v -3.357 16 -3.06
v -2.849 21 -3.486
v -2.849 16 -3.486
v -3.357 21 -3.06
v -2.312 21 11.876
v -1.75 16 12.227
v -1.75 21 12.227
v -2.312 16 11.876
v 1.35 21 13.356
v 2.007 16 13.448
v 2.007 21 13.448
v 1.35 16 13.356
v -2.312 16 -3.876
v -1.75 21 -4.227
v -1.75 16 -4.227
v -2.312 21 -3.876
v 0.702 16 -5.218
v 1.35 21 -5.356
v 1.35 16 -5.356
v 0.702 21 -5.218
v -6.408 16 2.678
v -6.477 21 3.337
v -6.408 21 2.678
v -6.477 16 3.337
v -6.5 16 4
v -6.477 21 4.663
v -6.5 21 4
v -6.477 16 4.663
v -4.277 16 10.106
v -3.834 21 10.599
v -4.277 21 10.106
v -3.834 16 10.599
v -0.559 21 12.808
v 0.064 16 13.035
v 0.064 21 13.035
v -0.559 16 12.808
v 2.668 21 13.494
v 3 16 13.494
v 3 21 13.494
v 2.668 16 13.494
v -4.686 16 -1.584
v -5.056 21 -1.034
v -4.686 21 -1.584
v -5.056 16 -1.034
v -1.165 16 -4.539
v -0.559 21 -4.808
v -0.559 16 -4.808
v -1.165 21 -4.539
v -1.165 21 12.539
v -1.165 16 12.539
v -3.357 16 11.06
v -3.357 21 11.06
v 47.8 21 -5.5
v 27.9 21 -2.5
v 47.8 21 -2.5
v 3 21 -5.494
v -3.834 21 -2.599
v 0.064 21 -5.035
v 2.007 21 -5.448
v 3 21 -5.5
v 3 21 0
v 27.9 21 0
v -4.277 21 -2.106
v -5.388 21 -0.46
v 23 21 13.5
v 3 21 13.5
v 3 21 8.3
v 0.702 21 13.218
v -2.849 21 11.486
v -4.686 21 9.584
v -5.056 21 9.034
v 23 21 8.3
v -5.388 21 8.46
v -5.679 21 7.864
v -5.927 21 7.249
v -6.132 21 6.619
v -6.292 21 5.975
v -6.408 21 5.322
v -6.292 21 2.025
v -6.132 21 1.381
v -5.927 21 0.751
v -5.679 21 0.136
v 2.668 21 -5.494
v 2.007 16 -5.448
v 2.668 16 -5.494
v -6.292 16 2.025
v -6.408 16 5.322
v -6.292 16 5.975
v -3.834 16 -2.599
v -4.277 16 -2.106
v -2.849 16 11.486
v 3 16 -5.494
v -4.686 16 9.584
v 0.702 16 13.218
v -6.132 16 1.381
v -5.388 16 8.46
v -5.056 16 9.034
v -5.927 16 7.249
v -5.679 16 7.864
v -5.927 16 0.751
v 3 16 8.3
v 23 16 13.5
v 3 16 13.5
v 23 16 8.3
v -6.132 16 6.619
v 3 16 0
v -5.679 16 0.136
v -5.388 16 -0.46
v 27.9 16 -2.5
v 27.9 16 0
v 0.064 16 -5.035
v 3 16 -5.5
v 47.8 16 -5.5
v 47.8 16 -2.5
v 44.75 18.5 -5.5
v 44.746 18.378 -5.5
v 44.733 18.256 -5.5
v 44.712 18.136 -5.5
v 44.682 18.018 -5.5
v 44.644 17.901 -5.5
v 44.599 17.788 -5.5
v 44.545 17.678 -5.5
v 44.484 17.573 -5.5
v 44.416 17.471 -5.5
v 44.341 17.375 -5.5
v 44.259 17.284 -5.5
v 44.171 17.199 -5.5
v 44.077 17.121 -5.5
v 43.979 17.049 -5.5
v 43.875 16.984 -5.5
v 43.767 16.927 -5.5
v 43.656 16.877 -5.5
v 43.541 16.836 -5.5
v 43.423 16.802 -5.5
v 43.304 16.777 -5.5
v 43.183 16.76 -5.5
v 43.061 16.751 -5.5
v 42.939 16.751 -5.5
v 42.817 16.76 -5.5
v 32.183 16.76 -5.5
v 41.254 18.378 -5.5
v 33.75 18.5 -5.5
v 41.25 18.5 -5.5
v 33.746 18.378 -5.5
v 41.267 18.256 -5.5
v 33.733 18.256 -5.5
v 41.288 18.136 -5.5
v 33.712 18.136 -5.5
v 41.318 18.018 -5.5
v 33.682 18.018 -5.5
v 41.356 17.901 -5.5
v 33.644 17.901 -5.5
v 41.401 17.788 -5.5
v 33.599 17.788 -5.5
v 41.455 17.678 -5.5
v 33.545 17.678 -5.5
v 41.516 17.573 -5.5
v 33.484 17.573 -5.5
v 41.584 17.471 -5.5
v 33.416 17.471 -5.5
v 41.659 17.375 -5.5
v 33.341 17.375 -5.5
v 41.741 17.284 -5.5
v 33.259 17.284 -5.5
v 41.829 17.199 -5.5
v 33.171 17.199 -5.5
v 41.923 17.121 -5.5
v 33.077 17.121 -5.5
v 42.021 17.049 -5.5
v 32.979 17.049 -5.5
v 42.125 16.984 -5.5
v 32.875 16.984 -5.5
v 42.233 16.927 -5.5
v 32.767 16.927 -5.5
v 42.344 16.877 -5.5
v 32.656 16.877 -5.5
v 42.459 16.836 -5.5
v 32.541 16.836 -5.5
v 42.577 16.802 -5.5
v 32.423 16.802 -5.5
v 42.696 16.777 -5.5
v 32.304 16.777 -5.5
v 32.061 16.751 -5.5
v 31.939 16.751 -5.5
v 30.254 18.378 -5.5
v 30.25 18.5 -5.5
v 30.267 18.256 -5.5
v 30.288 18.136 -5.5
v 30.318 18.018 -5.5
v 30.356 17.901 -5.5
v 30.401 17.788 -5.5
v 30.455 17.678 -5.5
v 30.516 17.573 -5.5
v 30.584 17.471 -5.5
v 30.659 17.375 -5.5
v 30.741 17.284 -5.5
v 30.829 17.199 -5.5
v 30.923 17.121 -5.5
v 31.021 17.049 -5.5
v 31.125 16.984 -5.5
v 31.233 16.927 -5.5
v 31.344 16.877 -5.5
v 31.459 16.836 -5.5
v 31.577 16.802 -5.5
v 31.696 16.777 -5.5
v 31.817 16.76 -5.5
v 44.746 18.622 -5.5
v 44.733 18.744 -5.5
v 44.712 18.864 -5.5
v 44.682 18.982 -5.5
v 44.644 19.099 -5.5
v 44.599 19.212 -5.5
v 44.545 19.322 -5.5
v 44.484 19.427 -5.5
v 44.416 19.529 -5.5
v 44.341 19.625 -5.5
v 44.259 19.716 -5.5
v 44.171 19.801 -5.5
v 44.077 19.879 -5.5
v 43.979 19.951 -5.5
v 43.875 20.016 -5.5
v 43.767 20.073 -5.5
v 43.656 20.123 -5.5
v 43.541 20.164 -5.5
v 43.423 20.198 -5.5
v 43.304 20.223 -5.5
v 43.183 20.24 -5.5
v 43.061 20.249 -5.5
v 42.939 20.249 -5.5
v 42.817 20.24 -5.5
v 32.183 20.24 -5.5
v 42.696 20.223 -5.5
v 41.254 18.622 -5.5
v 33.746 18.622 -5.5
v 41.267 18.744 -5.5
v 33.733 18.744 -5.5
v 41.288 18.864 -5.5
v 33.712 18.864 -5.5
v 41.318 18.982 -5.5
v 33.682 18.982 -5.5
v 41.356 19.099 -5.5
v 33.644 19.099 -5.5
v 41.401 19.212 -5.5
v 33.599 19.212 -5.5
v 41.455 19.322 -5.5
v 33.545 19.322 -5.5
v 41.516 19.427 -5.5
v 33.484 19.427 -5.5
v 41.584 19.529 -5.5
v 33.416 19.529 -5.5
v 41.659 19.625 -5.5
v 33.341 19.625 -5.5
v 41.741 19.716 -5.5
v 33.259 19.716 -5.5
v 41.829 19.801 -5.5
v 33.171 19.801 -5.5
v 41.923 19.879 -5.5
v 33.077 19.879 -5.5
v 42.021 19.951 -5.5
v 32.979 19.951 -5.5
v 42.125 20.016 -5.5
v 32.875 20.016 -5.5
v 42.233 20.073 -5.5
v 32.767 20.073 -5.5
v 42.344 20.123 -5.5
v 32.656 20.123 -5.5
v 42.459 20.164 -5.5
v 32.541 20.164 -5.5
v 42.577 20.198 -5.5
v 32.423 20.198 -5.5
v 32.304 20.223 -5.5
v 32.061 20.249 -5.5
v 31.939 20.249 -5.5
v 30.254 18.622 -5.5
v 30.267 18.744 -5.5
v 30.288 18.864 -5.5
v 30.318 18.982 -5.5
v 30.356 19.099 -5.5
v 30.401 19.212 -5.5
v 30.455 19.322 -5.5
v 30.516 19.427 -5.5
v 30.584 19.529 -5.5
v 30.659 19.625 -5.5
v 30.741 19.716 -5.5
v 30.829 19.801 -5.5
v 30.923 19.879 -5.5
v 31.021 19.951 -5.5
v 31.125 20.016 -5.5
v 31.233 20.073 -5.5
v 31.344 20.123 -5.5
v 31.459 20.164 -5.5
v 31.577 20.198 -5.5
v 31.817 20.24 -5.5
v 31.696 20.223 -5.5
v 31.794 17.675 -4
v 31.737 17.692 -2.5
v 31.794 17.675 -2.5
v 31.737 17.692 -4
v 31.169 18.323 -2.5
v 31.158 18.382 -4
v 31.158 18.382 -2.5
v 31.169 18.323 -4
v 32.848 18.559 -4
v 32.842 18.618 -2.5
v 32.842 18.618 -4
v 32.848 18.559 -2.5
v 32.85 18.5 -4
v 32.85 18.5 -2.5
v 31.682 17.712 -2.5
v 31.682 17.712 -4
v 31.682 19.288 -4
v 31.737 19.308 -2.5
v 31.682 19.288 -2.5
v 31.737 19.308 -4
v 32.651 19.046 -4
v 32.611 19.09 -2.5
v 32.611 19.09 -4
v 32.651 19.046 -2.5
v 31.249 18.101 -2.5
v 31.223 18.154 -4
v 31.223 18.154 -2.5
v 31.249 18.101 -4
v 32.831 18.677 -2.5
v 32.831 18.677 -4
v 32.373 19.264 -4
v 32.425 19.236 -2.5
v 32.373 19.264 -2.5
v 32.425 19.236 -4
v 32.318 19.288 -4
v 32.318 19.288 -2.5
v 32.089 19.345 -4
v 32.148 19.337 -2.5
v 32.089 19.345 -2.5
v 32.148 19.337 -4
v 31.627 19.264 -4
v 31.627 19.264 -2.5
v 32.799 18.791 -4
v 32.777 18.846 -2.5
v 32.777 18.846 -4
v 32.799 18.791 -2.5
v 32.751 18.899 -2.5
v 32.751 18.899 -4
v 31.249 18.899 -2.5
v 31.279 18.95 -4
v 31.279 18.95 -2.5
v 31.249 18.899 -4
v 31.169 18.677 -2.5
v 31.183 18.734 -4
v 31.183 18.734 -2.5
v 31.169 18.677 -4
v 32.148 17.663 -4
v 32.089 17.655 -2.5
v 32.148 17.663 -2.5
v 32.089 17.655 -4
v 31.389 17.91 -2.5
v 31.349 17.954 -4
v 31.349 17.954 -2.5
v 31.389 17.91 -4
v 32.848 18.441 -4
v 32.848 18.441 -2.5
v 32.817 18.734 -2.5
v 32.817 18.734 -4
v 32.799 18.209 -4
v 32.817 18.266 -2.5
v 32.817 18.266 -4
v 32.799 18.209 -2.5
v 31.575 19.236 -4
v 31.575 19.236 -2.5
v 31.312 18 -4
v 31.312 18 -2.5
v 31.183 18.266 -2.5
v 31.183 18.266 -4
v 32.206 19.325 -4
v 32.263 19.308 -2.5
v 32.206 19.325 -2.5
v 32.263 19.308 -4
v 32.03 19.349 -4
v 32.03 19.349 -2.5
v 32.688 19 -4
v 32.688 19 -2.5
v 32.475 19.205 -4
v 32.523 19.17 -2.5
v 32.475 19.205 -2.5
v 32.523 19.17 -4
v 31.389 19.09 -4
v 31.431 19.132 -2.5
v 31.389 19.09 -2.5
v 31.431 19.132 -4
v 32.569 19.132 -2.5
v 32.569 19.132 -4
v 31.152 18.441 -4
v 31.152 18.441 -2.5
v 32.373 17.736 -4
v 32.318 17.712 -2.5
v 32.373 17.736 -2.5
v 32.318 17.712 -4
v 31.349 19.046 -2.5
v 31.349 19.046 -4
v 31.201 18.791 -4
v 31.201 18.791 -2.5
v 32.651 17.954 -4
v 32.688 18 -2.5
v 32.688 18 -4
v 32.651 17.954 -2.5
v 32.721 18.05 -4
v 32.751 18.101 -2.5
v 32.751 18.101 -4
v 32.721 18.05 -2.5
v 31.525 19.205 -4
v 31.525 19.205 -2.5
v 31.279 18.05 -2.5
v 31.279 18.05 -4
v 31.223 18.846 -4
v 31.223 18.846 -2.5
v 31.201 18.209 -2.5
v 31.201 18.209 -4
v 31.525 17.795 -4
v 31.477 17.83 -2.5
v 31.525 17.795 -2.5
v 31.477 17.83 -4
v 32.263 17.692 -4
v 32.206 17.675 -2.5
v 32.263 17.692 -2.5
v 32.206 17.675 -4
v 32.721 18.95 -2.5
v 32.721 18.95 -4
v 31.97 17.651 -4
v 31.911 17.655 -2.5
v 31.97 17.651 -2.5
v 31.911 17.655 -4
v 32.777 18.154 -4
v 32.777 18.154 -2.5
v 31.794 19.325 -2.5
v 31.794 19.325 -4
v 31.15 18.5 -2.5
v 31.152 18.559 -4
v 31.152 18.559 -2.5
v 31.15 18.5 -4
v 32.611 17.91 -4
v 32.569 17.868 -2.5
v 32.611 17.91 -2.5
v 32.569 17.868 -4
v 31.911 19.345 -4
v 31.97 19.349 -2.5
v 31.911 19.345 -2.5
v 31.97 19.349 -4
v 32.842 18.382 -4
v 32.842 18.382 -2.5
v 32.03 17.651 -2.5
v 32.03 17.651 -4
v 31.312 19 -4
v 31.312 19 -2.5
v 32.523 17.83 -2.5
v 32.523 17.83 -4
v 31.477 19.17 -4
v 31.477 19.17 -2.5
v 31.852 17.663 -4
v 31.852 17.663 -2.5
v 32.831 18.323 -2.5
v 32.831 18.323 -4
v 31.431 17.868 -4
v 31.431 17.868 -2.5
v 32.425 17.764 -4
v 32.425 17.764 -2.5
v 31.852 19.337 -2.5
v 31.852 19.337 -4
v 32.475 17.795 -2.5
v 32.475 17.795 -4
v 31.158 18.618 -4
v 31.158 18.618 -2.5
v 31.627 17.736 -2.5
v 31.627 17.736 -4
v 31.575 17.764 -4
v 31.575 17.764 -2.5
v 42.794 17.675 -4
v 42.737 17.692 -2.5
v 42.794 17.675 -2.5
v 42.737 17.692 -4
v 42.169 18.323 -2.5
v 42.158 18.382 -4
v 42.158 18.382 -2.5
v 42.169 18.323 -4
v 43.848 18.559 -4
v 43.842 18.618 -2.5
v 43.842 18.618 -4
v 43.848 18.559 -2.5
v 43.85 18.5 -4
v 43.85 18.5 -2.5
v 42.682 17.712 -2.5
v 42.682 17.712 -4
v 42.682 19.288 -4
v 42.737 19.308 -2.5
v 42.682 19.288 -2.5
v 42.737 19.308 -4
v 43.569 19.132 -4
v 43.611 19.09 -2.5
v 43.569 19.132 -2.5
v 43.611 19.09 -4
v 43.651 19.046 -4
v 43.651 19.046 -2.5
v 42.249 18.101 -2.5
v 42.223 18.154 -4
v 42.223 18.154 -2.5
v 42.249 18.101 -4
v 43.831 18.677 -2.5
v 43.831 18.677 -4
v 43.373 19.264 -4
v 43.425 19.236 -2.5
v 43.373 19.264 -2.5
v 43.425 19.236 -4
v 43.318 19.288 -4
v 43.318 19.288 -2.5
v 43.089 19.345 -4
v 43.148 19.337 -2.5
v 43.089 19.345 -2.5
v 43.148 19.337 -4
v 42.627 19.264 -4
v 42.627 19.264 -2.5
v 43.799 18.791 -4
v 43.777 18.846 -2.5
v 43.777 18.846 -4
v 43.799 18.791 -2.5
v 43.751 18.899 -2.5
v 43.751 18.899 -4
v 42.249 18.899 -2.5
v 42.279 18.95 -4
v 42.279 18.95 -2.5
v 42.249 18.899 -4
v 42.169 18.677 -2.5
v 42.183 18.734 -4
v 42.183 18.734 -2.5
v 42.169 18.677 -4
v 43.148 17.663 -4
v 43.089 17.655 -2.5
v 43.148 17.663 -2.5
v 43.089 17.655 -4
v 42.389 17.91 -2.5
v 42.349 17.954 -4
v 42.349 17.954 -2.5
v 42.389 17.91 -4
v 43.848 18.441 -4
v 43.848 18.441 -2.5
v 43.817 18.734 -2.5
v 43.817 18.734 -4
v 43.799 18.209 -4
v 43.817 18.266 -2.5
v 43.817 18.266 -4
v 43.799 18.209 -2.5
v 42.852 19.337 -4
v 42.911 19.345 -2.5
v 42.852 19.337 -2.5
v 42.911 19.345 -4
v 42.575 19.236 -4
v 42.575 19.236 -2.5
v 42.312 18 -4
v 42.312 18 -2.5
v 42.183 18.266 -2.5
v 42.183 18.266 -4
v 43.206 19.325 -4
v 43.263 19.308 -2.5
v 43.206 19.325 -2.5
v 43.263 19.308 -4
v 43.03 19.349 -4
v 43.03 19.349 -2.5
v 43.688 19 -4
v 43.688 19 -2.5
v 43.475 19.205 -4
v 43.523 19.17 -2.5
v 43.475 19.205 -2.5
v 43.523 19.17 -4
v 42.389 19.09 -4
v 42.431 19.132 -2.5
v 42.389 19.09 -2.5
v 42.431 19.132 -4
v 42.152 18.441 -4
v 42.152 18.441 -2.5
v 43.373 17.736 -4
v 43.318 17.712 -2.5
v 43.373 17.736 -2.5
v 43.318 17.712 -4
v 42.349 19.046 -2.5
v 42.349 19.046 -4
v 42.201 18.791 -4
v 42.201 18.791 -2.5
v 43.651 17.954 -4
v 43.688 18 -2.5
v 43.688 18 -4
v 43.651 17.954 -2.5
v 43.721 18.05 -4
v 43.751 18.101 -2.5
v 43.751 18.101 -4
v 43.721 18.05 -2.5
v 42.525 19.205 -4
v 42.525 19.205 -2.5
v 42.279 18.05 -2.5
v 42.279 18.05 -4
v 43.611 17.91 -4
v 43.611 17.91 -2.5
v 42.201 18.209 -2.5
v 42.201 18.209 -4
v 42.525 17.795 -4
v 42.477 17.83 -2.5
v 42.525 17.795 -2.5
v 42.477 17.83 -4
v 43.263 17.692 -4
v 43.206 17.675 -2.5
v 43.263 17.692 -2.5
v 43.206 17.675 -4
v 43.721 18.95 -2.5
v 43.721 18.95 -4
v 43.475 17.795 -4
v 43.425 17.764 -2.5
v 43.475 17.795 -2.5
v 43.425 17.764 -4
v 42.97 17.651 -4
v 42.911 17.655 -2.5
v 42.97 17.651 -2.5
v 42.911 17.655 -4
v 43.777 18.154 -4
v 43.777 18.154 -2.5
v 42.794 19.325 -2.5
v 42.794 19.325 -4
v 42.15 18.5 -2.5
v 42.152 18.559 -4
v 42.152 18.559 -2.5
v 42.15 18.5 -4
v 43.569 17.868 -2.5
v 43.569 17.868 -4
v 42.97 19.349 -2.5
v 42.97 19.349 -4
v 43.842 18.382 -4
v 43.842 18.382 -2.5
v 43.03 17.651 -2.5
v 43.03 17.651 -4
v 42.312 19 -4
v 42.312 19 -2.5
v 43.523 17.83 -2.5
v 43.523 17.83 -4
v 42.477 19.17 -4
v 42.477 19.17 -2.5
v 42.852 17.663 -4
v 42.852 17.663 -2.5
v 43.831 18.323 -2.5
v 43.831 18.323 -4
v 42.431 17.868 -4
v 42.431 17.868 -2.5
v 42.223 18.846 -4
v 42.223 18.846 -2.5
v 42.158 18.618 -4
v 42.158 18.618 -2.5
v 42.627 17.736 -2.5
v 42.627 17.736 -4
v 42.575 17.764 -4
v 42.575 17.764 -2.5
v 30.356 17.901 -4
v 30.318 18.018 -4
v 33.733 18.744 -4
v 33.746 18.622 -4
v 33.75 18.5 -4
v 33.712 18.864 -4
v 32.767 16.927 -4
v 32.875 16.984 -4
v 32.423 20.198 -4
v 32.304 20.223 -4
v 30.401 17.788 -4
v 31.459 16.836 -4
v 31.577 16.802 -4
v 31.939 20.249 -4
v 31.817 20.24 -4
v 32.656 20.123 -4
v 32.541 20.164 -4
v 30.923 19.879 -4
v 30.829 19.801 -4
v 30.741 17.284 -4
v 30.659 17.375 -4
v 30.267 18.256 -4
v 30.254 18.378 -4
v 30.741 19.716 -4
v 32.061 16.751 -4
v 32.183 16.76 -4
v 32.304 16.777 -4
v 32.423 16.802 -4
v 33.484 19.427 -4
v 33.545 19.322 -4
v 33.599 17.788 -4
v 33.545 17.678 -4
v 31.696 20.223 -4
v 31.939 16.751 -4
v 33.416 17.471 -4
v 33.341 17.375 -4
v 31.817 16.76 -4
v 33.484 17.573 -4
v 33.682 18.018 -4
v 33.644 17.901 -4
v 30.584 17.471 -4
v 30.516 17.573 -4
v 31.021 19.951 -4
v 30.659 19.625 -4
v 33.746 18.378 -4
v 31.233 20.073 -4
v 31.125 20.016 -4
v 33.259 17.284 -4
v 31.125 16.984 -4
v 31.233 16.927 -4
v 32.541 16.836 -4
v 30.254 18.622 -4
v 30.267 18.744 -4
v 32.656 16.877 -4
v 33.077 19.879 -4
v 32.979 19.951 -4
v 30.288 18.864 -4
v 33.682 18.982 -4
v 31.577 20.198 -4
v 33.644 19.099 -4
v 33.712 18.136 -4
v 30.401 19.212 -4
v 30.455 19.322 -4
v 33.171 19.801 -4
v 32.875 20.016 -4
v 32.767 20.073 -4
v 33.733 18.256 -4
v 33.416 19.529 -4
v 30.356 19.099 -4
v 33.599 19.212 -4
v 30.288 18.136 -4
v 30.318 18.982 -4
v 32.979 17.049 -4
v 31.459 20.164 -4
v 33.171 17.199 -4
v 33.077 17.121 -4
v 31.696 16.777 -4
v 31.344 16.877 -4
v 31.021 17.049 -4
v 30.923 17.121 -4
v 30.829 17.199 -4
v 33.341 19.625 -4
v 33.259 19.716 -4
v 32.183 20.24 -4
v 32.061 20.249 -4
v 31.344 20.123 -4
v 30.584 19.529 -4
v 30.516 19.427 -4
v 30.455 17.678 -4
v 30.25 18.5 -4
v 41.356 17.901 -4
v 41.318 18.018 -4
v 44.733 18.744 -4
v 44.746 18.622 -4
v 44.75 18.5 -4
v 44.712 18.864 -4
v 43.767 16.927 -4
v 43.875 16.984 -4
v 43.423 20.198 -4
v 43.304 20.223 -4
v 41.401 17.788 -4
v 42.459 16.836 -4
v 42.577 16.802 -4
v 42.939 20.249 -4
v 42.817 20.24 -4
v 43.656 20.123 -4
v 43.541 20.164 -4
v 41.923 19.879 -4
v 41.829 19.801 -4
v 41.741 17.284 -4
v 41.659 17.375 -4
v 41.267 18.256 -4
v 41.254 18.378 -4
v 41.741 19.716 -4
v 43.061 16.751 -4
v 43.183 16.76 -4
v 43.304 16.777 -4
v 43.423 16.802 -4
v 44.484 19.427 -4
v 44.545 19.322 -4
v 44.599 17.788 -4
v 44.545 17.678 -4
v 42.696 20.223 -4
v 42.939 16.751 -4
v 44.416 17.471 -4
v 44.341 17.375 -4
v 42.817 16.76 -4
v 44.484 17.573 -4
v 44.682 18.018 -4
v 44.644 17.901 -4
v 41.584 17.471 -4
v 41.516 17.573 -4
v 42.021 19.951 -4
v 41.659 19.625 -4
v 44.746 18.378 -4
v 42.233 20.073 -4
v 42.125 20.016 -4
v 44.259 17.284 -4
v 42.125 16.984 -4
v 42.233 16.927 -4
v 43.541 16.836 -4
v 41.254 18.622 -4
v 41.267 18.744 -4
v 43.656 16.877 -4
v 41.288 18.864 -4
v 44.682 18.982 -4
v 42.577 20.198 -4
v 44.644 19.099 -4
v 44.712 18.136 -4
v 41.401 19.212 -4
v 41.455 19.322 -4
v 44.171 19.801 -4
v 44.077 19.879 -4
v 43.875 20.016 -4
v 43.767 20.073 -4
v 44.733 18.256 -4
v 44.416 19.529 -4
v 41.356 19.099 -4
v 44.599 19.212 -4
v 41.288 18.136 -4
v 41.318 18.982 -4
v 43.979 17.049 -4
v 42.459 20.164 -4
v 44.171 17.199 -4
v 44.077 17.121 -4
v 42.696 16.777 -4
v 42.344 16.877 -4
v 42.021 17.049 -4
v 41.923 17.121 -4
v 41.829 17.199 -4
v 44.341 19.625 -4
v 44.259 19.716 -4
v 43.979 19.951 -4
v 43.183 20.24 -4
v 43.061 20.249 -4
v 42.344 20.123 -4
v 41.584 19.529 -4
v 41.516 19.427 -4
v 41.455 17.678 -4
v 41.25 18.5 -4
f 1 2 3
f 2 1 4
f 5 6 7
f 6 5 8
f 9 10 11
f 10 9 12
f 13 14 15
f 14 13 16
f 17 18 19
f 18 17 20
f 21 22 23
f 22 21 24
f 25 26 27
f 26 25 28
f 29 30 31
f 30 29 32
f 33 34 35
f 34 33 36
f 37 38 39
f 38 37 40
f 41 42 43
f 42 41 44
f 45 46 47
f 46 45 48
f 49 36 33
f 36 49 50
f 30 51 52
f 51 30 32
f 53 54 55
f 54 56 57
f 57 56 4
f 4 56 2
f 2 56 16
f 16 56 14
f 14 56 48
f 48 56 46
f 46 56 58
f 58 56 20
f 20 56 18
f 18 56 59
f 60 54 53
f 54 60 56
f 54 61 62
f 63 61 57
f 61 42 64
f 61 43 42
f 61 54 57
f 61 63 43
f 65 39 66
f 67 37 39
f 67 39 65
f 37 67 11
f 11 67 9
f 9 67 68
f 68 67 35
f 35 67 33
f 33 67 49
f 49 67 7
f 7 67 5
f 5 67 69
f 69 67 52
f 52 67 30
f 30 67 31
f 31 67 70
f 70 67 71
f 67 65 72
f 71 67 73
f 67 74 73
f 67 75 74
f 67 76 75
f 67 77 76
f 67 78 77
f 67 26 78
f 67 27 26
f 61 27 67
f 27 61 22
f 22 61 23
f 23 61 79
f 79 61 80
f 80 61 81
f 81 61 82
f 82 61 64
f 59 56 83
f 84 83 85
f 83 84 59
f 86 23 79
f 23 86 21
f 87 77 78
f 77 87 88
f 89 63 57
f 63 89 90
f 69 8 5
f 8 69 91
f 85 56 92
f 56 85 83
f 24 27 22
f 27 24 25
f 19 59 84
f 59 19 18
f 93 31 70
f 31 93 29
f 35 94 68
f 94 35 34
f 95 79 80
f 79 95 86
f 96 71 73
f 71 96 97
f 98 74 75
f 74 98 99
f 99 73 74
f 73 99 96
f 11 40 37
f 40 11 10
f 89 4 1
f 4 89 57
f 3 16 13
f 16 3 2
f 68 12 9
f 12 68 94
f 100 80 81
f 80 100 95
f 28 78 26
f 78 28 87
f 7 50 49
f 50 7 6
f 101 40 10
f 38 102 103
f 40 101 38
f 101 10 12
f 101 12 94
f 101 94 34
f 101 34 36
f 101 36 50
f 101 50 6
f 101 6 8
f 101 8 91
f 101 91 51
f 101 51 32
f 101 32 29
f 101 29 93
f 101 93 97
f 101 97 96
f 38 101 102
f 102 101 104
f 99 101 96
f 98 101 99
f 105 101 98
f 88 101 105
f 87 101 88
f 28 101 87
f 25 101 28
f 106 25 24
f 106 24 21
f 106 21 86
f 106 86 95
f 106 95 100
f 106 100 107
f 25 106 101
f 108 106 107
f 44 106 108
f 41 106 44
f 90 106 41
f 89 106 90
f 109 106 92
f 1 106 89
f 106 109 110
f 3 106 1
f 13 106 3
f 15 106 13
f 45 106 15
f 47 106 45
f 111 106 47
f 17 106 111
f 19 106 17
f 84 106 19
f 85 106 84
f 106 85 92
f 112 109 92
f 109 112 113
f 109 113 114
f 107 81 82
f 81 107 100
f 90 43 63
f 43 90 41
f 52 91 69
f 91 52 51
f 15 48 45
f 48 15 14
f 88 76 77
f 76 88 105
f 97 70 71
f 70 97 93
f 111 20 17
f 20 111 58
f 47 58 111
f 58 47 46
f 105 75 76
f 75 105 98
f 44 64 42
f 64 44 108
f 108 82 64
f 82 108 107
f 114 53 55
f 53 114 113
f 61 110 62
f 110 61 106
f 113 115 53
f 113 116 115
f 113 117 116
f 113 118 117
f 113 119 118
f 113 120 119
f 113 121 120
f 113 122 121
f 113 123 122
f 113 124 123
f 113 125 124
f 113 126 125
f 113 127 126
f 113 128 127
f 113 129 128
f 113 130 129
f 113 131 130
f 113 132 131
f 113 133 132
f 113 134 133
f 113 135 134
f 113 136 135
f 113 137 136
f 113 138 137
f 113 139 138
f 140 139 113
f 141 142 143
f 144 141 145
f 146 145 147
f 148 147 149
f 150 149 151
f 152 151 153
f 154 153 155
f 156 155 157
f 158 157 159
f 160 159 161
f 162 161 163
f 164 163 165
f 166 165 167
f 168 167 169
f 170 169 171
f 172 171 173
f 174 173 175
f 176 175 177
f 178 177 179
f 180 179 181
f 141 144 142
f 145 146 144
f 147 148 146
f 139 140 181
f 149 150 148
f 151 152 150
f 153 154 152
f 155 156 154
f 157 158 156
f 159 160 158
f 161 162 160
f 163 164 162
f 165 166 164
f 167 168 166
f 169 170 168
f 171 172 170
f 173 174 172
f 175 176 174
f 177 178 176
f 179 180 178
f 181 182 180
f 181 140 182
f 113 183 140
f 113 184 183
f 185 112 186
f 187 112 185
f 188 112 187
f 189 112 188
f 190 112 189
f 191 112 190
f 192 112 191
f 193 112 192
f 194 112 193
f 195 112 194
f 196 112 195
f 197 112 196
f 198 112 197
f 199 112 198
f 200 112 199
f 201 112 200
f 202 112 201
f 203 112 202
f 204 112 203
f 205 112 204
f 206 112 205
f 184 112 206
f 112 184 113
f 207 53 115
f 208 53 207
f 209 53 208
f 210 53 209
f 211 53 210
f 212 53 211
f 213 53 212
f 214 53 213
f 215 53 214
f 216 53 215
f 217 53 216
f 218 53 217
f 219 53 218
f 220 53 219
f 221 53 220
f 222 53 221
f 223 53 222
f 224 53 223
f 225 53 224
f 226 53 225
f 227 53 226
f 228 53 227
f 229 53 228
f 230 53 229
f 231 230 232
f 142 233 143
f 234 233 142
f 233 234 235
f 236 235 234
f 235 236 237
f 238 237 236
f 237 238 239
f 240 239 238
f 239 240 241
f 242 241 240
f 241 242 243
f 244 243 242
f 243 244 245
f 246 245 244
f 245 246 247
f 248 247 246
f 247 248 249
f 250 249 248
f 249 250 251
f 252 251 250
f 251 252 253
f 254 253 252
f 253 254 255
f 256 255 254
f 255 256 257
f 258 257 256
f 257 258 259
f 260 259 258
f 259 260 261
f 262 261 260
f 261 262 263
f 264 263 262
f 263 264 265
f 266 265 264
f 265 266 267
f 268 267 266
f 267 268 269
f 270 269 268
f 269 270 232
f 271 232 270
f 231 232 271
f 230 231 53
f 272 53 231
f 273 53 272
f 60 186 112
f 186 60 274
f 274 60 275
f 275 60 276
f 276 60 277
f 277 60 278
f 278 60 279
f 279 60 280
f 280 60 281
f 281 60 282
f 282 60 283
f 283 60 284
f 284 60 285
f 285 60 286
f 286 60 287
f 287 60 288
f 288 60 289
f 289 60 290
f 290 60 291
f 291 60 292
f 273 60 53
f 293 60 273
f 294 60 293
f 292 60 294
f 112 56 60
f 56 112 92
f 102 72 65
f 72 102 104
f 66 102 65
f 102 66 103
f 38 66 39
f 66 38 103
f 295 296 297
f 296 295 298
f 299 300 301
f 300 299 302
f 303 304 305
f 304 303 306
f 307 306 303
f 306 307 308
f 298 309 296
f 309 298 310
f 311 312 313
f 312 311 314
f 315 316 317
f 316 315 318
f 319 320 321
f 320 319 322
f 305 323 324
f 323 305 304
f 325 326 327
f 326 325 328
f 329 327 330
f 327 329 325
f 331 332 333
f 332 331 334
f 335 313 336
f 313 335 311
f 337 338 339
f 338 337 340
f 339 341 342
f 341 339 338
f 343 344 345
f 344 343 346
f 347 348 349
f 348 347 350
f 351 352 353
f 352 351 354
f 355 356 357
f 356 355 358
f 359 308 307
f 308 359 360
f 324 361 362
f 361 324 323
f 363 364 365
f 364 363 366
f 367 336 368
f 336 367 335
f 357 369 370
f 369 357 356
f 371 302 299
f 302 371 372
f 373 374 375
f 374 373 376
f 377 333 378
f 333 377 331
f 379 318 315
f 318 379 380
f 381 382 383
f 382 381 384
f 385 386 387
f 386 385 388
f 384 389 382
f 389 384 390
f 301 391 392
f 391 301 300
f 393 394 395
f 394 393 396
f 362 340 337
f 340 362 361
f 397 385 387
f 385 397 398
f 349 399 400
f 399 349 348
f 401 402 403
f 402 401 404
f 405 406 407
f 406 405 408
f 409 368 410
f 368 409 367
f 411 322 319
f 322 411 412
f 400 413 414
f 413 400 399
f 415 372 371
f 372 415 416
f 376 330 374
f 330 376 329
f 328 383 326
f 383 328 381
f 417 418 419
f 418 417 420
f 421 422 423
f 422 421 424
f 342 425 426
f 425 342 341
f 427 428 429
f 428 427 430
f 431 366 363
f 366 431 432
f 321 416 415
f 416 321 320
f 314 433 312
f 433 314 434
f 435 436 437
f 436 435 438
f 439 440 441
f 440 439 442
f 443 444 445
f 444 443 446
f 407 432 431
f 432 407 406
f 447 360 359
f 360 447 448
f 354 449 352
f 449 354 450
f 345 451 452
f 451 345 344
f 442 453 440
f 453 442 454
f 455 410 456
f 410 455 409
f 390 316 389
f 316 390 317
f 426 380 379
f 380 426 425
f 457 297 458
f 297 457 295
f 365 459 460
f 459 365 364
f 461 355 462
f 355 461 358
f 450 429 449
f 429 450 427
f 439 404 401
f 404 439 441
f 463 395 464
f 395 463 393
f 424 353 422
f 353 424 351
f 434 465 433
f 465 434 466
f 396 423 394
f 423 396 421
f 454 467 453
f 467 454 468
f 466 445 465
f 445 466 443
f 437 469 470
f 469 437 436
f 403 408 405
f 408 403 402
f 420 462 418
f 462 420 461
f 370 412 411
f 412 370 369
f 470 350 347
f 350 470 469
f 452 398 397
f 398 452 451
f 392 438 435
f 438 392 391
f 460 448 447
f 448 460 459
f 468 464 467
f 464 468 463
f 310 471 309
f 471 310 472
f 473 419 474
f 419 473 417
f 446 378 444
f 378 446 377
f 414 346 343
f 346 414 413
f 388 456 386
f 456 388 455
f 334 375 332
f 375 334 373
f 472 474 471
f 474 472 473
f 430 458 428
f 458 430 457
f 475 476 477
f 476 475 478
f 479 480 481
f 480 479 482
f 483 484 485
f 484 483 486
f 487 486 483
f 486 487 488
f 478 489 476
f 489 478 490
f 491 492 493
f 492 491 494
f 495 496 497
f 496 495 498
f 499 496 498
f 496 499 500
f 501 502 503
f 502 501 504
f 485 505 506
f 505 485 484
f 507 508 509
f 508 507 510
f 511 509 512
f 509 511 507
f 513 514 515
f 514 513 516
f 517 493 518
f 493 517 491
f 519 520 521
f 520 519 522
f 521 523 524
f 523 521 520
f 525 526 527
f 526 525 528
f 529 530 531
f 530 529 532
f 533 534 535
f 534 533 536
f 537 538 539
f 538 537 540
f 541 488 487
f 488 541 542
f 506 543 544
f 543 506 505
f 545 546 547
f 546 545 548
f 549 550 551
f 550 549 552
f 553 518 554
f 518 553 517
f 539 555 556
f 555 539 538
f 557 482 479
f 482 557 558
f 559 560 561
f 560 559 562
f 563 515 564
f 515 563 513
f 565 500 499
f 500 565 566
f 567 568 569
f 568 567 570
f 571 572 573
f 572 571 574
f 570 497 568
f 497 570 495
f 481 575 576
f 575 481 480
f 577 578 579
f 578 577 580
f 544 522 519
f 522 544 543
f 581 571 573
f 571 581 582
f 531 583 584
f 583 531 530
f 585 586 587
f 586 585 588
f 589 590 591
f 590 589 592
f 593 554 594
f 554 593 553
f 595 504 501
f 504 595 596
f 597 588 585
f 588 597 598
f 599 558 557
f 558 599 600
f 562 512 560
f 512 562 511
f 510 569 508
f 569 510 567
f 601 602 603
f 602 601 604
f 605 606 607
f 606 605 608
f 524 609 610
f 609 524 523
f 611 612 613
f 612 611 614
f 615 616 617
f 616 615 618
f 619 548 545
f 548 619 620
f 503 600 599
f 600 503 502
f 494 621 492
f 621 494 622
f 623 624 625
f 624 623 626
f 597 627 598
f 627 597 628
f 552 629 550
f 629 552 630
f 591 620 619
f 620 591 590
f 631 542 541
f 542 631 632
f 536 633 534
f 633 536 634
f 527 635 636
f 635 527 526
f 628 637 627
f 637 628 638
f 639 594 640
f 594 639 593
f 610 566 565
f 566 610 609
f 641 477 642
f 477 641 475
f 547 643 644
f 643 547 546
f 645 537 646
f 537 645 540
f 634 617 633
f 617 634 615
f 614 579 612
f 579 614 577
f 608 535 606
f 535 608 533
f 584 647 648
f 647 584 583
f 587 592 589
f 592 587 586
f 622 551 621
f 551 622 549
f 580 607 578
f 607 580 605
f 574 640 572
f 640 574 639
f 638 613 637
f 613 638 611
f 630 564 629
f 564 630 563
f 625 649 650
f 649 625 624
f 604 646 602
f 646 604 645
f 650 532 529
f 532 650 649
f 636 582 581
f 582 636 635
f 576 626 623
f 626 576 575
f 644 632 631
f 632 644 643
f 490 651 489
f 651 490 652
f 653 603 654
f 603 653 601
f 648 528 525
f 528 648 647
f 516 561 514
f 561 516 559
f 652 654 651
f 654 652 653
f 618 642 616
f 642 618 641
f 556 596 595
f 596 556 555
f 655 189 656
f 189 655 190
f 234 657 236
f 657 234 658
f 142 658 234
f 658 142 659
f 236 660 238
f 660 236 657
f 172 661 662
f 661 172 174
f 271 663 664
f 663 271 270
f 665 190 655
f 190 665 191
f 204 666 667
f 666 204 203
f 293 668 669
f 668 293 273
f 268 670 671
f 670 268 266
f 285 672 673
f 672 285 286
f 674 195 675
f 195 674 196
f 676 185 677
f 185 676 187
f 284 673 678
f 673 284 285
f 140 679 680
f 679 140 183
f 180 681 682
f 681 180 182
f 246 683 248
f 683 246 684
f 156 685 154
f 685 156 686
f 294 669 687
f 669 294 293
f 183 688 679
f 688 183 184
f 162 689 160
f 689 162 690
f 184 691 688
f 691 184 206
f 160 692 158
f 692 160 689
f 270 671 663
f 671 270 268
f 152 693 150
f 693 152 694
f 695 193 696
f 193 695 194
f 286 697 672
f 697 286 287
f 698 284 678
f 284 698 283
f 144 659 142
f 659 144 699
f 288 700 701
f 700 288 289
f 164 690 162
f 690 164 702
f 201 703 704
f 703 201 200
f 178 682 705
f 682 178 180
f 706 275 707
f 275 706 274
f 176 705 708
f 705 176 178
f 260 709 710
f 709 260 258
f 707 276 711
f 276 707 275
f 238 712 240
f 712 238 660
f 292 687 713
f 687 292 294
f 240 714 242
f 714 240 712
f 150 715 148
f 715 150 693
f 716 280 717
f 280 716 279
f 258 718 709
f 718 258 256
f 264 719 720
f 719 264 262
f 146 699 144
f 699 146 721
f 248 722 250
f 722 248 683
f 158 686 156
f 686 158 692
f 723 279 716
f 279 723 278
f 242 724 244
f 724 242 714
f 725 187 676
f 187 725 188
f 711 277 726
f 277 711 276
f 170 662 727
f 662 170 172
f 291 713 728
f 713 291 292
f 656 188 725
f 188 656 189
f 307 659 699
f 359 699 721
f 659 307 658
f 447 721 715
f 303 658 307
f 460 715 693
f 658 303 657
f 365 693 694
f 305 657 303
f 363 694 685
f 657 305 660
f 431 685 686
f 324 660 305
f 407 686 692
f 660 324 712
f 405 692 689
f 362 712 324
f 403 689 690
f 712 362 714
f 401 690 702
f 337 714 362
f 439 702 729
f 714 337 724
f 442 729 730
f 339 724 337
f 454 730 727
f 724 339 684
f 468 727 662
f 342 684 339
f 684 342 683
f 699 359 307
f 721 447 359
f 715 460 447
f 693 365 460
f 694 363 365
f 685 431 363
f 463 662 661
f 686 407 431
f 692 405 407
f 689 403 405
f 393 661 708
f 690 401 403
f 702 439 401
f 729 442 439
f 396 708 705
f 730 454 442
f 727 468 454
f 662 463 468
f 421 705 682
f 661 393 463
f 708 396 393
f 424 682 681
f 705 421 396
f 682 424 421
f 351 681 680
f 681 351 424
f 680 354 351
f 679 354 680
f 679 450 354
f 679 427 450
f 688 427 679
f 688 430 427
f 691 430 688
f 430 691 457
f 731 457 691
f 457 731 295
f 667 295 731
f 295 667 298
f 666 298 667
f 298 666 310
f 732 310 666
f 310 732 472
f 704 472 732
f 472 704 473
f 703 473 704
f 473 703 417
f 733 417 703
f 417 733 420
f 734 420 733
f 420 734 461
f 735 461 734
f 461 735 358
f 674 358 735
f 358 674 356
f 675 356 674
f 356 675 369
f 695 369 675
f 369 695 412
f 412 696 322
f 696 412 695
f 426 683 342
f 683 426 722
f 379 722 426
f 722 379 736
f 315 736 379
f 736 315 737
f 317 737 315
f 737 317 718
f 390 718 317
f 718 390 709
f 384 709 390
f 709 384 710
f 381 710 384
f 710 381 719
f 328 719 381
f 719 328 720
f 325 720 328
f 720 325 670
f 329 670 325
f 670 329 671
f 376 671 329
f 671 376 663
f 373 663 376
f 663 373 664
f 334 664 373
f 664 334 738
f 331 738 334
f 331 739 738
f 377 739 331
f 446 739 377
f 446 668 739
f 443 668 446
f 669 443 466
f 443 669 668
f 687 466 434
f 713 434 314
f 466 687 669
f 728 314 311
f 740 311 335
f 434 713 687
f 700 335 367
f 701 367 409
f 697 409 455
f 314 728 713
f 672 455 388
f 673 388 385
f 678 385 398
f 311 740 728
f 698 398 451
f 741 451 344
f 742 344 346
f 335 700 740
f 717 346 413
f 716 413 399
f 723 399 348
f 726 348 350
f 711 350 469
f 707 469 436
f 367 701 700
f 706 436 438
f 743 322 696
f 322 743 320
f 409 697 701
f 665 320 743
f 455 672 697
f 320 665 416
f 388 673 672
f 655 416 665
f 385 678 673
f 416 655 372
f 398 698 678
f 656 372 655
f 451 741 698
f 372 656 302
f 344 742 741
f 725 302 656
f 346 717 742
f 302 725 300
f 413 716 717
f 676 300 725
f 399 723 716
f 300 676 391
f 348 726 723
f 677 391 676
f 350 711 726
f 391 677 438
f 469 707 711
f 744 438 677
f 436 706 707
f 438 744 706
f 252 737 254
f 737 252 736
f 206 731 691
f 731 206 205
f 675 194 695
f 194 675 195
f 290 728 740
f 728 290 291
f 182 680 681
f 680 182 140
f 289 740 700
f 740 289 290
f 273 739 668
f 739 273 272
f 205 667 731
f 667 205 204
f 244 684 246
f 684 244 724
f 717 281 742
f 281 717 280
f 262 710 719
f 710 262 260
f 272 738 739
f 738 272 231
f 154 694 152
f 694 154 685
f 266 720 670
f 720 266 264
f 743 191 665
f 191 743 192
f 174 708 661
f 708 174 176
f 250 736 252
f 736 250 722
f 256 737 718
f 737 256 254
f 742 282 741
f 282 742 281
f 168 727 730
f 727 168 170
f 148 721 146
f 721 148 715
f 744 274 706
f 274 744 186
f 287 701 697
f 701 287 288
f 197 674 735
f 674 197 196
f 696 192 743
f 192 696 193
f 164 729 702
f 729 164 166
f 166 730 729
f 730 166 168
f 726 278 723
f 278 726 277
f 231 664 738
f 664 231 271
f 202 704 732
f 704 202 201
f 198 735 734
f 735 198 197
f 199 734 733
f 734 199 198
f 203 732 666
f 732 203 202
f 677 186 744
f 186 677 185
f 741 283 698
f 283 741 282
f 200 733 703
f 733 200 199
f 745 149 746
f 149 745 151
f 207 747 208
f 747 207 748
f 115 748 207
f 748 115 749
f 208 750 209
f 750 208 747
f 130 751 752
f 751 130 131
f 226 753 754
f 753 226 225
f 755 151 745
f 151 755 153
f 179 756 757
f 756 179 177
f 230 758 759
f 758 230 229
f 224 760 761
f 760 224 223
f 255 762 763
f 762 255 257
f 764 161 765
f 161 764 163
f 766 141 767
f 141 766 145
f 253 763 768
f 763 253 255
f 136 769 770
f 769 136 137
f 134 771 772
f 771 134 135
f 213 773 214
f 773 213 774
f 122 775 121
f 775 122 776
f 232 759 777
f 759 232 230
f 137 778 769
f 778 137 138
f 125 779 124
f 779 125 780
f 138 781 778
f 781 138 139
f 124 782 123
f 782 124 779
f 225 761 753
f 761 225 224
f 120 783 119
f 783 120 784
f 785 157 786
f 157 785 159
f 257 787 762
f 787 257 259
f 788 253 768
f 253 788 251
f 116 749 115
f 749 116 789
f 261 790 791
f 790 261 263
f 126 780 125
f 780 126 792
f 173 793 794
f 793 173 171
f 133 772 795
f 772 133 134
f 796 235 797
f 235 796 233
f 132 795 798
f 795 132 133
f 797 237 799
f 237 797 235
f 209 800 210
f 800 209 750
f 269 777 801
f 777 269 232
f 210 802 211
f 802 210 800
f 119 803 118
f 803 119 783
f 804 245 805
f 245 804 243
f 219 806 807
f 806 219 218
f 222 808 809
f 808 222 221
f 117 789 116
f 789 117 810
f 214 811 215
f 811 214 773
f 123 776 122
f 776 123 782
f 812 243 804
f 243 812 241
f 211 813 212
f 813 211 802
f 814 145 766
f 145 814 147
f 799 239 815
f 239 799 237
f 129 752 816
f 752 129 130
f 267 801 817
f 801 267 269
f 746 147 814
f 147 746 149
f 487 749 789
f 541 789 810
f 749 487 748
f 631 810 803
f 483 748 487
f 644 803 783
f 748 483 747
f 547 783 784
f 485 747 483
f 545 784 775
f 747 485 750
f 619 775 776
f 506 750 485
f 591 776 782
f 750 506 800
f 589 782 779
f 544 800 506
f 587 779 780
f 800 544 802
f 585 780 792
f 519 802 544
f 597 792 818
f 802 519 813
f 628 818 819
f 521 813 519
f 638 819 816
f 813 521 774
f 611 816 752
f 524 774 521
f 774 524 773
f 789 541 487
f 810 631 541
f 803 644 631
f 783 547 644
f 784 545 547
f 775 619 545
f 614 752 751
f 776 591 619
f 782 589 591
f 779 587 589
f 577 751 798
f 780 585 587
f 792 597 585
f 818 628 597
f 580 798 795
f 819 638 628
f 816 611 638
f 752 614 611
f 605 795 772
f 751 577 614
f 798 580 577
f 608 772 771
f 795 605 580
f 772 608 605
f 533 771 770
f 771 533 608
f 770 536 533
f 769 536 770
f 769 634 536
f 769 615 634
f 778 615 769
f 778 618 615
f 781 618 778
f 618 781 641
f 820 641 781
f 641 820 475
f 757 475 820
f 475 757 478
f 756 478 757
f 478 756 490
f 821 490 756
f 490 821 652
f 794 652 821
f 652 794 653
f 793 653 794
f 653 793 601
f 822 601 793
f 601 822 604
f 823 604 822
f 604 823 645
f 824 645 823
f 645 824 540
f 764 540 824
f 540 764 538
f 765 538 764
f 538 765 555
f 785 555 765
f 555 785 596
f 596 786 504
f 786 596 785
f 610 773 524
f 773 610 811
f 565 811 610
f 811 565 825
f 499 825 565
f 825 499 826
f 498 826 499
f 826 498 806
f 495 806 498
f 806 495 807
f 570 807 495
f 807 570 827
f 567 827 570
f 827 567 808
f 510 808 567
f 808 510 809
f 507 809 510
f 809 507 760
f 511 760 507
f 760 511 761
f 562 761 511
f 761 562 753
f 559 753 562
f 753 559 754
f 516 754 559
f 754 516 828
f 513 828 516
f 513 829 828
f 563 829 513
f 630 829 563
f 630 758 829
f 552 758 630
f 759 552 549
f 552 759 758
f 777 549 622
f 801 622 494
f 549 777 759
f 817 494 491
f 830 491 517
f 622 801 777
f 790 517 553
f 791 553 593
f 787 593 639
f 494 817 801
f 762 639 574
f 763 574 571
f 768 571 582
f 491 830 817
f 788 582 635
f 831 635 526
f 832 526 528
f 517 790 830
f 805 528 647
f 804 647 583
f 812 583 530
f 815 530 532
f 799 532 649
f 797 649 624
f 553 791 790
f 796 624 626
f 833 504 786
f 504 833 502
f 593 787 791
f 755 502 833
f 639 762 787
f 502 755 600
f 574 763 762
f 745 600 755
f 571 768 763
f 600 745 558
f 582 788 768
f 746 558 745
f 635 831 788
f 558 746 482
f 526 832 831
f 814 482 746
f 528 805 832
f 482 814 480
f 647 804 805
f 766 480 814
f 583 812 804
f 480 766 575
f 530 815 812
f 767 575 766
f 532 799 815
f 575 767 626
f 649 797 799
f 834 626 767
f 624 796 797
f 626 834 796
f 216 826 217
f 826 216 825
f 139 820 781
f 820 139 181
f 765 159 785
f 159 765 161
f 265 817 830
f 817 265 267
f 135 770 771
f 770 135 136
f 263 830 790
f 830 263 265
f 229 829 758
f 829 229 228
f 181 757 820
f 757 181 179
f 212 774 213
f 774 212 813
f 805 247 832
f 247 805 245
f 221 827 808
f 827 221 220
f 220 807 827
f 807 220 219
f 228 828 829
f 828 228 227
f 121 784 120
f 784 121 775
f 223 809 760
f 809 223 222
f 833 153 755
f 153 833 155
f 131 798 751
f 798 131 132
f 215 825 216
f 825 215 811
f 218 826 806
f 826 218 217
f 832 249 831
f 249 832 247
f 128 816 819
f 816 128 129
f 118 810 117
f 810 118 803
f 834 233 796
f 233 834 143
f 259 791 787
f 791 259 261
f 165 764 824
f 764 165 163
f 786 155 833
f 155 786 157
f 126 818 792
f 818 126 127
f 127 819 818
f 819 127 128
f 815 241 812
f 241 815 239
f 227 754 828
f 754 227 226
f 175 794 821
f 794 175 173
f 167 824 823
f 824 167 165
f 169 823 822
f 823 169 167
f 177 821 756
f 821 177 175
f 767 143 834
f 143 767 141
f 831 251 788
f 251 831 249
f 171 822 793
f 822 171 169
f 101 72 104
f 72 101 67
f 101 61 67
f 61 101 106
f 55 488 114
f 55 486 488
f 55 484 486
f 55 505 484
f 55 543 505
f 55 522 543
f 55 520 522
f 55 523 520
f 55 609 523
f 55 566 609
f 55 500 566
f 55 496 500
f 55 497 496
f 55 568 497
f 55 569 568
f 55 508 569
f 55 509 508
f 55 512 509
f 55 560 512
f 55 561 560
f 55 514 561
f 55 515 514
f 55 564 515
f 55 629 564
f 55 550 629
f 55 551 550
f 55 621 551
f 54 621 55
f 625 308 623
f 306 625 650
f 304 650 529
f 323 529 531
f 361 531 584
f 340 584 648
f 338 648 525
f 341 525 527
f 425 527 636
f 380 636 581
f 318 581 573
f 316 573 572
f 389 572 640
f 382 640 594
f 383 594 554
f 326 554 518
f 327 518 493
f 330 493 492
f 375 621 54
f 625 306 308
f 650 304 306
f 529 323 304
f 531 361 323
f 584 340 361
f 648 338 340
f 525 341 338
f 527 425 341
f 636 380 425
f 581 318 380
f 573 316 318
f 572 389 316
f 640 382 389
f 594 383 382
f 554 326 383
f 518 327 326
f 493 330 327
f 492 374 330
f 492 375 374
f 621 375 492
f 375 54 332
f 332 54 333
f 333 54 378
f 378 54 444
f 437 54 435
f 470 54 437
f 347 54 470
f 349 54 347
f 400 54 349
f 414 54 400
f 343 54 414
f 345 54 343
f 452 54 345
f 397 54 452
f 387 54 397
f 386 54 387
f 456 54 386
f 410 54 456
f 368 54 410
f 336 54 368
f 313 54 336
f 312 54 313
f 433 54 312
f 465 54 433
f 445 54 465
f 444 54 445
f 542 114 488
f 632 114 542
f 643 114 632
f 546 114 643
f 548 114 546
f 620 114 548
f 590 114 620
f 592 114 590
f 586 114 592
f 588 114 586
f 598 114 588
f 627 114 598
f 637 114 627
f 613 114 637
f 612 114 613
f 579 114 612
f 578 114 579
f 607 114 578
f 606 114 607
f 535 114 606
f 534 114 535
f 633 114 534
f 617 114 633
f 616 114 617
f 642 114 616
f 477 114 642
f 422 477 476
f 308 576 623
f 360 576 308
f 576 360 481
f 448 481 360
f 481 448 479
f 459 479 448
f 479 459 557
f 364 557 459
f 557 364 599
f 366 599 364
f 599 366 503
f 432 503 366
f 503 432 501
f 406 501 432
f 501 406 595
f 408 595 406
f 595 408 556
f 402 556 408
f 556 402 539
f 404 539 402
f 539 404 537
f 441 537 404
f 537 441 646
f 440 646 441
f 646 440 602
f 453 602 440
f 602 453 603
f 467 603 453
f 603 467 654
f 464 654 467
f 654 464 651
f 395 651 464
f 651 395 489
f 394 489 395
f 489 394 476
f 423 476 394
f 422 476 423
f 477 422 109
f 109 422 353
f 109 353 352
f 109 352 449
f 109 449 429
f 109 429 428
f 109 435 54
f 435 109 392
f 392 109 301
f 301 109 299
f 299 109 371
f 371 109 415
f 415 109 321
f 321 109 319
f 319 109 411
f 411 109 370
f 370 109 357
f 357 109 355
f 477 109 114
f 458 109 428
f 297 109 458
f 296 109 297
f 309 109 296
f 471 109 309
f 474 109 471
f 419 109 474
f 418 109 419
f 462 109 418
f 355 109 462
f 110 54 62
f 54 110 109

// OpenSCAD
$fn = 90;

height = 170;
thickness = 5.5;
mount_offset = 25;

difference() {
    translate([0, 0, 0]) {
        //translate([0, 4, 0]) mount(true);
        //translate([0, 90, 0]) mount(true);
        
        translate([0, 14, 0]) mount(false);
    }
    //translate([40, 0, -20]) cube([167, 116, 30]);
    //translate([-30, 0, 0]) cube([167, 116, 30]);
}

//#cube([167, 116, 8.3]);

module mount(base = true) {
    difference() {
        translate([0, 0, 0]) {
            if (!base) {
                translate([3, 7, 4]) 
                    rotate([90, 0, 0]) 
                        cylinder(d = 19, h = 5);
            }
            
            if (base) {
                translate([3, 2, -thickness]) cube([height, 5, thickness]);
                translate([height + 3, 7, -7.5]) 
                    rotate([90, 0, 0]) 
                        cylinder(d = 15, h = 5);
            } else {
                translate([3, 2, -thickness]) 
                    cube([mount_offset + 19.8, 5, thickness]);
            }
            
            if (!base) {
                translate([3, 2, 8]) cube([20, 5, thickness]);
            }
            
        }
        
        translate([3, 0, 0]) cube([167, 116, 8.3]);
        translate([height - 16, 0, -10.5]) cube([20, 120, 5]);
        
        if (base) {
            translate([2.9, 0, -7.4]) cube([20, 10, 5]);
        } else {
            translate([mount_offset + 2.9, 0, -2.5]) cube([20, 10, 5]);
        }
        
        if (base) {
            translate([7, 4.5, -8]) cylinder(d = 1.5, h = 10);
            translate([18, 4.5, -8]) cylinder(d = 1.5, h = 10);
        }
        
        translate([mount_offset, 0, 0]) if (!base) {
            translate([7, 4.5, -8]) cylinder(d = 1.7, h = 10);
            translate([18, 4.5, -8]) cylinder(d = 1.7, h = 10);
            translate([7, 4.5, -5.6]) cylinder(d = 3.5, h = 1.6);
            translate([18, 4.5, -5.6]) cylinder(d = 3.5, h = 1.6);
        }
        
        //#translate([18, 3.5, -3.6]) cylinder(d = 1.4, h = 3.5);
    }
}


//translate([26, 7, -thickness]) cube([5, 90, thickness]);
//translate([118, 7, -thickness]) cube([5, 90, thickness]);

//translate([33, 7, -thickness]) rotate([0, 0, 45]) cube([122, 5, thickness]);
//translate([30, 93, -thickness]) rotate([0, 0, -45]) cube([122, 5, thickness]);
